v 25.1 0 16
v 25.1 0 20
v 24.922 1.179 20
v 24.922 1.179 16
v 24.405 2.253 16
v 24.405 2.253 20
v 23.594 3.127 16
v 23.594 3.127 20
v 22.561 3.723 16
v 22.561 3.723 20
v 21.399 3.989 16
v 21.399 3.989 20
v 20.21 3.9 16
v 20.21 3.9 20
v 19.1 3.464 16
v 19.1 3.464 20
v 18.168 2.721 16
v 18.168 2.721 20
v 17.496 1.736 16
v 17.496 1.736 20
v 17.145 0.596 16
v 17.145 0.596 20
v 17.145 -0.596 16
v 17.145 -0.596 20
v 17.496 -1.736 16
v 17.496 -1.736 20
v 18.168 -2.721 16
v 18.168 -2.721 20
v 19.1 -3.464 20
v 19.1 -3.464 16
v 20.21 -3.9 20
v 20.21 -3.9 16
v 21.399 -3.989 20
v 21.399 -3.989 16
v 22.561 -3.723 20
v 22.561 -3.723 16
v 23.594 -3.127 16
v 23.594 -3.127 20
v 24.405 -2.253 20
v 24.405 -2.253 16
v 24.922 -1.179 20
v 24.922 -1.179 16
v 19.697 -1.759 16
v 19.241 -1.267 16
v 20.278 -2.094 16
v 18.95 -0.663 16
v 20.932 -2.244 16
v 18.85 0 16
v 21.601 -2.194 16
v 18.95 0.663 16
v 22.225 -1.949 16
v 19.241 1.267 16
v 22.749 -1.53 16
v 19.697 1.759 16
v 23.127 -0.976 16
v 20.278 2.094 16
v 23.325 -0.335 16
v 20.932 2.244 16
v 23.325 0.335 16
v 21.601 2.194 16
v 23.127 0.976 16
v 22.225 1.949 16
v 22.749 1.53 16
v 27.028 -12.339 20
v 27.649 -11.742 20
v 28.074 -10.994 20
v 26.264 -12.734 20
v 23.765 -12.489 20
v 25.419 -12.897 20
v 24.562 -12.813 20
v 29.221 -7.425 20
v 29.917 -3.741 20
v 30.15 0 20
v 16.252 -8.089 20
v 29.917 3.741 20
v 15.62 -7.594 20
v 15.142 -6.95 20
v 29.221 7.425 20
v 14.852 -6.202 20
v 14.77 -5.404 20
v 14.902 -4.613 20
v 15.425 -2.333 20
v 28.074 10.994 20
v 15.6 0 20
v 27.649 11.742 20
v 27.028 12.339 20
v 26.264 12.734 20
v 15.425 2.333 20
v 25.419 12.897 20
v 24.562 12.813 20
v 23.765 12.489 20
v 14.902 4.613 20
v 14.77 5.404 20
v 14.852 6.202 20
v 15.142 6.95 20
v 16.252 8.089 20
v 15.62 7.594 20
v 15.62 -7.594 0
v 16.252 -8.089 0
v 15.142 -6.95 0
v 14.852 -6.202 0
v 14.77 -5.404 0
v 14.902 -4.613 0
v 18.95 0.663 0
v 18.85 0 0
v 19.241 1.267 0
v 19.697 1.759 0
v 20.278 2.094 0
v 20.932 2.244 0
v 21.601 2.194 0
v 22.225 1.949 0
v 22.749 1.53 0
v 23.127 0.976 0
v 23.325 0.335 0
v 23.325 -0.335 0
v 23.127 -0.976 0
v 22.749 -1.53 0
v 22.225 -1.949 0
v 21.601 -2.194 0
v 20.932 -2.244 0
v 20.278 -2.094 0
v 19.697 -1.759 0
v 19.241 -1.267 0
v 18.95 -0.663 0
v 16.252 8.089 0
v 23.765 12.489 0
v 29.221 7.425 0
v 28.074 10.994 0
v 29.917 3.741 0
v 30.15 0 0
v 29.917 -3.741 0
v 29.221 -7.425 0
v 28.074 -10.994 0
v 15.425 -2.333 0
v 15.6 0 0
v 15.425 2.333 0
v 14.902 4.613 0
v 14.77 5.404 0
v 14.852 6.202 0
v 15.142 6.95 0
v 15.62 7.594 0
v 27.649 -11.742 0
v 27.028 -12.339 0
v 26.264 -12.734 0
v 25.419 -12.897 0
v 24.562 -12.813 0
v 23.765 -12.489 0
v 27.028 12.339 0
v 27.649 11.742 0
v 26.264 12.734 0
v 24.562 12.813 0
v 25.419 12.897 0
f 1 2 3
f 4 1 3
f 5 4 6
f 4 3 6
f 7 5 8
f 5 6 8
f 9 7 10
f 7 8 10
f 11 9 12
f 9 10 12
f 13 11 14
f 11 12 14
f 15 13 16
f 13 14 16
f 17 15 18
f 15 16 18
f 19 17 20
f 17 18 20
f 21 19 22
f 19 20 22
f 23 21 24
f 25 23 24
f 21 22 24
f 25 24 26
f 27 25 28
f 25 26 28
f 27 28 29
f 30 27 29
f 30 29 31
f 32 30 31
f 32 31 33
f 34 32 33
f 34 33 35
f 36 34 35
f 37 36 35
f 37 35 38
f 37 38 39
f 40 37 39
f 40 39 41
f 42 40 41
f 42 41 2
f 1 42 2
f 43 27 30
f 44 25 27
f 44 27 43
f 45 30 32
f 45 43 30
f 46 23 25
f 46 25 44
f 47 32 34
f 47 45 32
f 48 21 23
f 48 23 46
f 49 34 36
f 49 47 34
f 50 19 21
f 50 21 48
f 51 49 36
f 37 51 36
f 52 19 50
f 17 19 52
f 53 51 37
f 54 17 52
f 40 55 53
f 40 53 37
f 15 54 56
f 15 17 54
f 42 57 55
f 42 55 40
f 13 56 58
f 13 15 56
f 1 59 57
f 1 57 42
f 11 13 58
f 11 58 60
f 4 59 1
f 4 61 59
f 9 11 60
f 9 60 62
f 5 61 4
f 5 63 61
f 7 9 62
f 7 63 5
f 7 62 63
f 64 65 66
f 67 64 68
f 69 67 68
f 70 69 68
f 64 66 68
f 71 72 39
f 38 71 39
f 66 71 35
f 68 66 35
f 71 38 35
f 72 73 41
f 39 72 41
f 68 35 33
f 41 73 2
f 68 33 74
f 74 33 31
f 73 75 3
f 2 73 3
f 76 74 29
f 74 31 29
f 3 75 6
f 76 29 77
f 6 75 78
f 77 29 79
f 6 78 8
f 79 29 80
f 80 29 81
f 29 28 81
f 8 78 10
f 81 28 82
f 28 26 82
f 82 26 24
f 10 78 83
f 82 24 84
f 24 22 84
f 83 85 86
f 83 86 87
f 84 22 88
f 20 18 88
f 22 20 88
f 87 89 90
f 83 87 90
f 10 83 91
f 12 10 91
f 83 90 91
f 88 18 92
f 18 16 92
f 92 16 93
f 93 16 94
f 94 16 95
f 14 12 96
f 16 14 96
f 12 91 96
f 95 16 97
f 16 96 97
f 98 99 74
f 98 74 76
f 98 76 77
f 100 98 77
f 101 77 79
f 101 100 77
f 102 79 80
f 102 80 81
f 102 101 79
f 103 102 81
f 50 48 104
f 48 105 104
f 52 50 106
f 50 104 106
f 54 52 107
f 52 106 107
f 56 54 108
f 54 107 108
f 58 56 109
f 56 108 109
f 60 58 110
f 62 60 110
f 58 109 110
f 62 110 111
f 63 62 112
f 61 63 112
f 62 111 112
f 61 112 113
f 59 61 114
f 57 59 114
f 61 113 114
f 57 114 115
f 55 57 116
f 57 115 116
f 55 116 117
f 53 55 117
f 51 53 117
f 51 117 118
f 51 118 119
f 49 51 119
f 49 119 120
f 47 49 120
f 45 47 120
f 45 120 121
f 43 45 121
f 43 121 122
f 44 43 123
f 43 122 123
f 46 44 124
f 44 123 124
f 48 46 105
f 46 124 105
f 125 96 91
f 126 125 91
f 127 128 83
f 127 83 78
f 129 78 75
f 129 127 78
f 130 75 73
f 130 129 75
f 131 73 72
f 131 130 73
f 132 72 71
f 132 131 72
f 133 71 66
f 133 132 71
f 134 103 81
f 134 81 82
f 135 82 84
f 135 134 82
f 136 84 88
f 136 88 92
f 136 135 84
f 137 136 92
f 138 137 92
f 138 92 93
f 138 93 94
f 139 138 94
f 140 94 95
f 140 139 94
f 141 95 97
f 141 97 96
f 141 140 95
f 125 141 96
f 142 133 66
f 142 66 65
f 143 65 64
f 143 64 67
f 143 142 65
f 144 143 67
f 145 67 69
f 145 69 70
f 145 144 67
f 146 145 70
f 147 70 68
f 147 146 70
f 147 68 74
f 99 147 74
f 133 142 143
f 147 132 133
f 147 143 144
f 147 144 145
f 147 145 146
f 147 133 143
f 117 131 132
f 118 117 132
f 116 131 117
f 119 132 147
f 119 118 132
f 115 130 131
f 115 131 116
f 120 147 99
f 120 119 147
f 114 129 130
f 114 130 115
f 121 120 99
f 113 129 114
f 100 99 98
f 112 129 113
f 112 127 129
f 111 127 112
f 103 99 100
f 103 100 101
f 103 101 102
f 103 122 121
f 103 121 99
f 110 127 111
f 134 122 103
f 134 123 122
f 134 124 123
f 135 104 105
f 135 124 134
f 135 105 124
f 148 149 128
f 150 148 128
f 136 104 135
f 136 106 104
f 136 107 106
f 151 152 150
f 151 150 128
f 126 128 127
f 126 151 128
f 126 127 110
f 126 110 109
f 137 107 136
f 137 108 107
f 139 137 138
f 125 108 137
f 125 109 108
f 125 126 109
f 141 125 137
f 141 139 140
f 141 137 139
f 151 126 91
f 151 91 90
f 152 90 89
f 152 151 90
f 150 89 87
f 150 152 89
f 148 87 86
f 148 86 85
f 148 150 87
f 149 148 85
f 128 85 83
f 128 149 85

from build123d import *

# Parameters (mm, degrees)
CORPO_DEPTH                 = 20
REBAIXO_SHCS_M4_D           = 4.5
REBAIXO_SHCS_M4_DEPTH       = 30
REBAIXO_SHCS_M4_CBORE_D     = 8
REBAIXO_SHCS_M4_CBORE_DEPTH = 4
REBAIXO_SHCS_M4_TIP         = 1.351936393


with BuildPart() as part:
    # Sketch1 → Corpo (new body)
    with BuildSketch(Plane.XY):
        with BuildLine():
            Line((16.252058195, 8.088672021), (23.764502557, 12.488672021))
            ThreePointArc((23.764502557, 12.488672021), (26.263743802, 12.734356122), (28.074119126, 10.993922652))
            ThreePointArc((28.074119126, 10.993922652), (30.15, 0), (28.074119126, -10.993922652))
            ThreePointArc((28.074119126, -10.993922652), (26.263743802, -12.734356122), (23.764502557, -12.488672021))
            Line((23.764502557, -12.488672021), (16.252058195, -8.088672021))
            ThreePointArc((16.252058195, -8.088672021), (14.971668435, -6.585929552), (14.902386515, -4.612903226))
            ThreePointArc((14.902386515, -4.612903226), (15.6, 0), (14.902386515, 4.612903226))
            ThreePointArc((14.902386515, 4.612903226), (14.971668435, 6.585929552), (16.252058195, 8.088672021))
        make_face()
    extrude(amount=CORPO_DEPTH)

    # Rebaixo SHCS M4
    with Locations(Plane.XY.offset(20)):
        with Locations((21.1, 0)):
            CounterBoreHole(REBAIXO_SHCS_M4_D / 2, REBAIXO_SHCS_M4_CBORE_D / 2, REBAIXO_SHCS_M4_CBORE_DEPTH, depth=REBAIXO_SHCS_M4_DEPTH)
            with Locations((0, 0, -(REBAIXO_SHCS_M4_DEPTH + REBAIXO_SHCS_M4_TIP / 2))):  # 118° drill point
                Cone(0, REBAIXO_SHCS_M4_D / 2, REBAIXO_SHCS_M4_TIP, mode=Mode.SUBTRACT)


solid = part.part
